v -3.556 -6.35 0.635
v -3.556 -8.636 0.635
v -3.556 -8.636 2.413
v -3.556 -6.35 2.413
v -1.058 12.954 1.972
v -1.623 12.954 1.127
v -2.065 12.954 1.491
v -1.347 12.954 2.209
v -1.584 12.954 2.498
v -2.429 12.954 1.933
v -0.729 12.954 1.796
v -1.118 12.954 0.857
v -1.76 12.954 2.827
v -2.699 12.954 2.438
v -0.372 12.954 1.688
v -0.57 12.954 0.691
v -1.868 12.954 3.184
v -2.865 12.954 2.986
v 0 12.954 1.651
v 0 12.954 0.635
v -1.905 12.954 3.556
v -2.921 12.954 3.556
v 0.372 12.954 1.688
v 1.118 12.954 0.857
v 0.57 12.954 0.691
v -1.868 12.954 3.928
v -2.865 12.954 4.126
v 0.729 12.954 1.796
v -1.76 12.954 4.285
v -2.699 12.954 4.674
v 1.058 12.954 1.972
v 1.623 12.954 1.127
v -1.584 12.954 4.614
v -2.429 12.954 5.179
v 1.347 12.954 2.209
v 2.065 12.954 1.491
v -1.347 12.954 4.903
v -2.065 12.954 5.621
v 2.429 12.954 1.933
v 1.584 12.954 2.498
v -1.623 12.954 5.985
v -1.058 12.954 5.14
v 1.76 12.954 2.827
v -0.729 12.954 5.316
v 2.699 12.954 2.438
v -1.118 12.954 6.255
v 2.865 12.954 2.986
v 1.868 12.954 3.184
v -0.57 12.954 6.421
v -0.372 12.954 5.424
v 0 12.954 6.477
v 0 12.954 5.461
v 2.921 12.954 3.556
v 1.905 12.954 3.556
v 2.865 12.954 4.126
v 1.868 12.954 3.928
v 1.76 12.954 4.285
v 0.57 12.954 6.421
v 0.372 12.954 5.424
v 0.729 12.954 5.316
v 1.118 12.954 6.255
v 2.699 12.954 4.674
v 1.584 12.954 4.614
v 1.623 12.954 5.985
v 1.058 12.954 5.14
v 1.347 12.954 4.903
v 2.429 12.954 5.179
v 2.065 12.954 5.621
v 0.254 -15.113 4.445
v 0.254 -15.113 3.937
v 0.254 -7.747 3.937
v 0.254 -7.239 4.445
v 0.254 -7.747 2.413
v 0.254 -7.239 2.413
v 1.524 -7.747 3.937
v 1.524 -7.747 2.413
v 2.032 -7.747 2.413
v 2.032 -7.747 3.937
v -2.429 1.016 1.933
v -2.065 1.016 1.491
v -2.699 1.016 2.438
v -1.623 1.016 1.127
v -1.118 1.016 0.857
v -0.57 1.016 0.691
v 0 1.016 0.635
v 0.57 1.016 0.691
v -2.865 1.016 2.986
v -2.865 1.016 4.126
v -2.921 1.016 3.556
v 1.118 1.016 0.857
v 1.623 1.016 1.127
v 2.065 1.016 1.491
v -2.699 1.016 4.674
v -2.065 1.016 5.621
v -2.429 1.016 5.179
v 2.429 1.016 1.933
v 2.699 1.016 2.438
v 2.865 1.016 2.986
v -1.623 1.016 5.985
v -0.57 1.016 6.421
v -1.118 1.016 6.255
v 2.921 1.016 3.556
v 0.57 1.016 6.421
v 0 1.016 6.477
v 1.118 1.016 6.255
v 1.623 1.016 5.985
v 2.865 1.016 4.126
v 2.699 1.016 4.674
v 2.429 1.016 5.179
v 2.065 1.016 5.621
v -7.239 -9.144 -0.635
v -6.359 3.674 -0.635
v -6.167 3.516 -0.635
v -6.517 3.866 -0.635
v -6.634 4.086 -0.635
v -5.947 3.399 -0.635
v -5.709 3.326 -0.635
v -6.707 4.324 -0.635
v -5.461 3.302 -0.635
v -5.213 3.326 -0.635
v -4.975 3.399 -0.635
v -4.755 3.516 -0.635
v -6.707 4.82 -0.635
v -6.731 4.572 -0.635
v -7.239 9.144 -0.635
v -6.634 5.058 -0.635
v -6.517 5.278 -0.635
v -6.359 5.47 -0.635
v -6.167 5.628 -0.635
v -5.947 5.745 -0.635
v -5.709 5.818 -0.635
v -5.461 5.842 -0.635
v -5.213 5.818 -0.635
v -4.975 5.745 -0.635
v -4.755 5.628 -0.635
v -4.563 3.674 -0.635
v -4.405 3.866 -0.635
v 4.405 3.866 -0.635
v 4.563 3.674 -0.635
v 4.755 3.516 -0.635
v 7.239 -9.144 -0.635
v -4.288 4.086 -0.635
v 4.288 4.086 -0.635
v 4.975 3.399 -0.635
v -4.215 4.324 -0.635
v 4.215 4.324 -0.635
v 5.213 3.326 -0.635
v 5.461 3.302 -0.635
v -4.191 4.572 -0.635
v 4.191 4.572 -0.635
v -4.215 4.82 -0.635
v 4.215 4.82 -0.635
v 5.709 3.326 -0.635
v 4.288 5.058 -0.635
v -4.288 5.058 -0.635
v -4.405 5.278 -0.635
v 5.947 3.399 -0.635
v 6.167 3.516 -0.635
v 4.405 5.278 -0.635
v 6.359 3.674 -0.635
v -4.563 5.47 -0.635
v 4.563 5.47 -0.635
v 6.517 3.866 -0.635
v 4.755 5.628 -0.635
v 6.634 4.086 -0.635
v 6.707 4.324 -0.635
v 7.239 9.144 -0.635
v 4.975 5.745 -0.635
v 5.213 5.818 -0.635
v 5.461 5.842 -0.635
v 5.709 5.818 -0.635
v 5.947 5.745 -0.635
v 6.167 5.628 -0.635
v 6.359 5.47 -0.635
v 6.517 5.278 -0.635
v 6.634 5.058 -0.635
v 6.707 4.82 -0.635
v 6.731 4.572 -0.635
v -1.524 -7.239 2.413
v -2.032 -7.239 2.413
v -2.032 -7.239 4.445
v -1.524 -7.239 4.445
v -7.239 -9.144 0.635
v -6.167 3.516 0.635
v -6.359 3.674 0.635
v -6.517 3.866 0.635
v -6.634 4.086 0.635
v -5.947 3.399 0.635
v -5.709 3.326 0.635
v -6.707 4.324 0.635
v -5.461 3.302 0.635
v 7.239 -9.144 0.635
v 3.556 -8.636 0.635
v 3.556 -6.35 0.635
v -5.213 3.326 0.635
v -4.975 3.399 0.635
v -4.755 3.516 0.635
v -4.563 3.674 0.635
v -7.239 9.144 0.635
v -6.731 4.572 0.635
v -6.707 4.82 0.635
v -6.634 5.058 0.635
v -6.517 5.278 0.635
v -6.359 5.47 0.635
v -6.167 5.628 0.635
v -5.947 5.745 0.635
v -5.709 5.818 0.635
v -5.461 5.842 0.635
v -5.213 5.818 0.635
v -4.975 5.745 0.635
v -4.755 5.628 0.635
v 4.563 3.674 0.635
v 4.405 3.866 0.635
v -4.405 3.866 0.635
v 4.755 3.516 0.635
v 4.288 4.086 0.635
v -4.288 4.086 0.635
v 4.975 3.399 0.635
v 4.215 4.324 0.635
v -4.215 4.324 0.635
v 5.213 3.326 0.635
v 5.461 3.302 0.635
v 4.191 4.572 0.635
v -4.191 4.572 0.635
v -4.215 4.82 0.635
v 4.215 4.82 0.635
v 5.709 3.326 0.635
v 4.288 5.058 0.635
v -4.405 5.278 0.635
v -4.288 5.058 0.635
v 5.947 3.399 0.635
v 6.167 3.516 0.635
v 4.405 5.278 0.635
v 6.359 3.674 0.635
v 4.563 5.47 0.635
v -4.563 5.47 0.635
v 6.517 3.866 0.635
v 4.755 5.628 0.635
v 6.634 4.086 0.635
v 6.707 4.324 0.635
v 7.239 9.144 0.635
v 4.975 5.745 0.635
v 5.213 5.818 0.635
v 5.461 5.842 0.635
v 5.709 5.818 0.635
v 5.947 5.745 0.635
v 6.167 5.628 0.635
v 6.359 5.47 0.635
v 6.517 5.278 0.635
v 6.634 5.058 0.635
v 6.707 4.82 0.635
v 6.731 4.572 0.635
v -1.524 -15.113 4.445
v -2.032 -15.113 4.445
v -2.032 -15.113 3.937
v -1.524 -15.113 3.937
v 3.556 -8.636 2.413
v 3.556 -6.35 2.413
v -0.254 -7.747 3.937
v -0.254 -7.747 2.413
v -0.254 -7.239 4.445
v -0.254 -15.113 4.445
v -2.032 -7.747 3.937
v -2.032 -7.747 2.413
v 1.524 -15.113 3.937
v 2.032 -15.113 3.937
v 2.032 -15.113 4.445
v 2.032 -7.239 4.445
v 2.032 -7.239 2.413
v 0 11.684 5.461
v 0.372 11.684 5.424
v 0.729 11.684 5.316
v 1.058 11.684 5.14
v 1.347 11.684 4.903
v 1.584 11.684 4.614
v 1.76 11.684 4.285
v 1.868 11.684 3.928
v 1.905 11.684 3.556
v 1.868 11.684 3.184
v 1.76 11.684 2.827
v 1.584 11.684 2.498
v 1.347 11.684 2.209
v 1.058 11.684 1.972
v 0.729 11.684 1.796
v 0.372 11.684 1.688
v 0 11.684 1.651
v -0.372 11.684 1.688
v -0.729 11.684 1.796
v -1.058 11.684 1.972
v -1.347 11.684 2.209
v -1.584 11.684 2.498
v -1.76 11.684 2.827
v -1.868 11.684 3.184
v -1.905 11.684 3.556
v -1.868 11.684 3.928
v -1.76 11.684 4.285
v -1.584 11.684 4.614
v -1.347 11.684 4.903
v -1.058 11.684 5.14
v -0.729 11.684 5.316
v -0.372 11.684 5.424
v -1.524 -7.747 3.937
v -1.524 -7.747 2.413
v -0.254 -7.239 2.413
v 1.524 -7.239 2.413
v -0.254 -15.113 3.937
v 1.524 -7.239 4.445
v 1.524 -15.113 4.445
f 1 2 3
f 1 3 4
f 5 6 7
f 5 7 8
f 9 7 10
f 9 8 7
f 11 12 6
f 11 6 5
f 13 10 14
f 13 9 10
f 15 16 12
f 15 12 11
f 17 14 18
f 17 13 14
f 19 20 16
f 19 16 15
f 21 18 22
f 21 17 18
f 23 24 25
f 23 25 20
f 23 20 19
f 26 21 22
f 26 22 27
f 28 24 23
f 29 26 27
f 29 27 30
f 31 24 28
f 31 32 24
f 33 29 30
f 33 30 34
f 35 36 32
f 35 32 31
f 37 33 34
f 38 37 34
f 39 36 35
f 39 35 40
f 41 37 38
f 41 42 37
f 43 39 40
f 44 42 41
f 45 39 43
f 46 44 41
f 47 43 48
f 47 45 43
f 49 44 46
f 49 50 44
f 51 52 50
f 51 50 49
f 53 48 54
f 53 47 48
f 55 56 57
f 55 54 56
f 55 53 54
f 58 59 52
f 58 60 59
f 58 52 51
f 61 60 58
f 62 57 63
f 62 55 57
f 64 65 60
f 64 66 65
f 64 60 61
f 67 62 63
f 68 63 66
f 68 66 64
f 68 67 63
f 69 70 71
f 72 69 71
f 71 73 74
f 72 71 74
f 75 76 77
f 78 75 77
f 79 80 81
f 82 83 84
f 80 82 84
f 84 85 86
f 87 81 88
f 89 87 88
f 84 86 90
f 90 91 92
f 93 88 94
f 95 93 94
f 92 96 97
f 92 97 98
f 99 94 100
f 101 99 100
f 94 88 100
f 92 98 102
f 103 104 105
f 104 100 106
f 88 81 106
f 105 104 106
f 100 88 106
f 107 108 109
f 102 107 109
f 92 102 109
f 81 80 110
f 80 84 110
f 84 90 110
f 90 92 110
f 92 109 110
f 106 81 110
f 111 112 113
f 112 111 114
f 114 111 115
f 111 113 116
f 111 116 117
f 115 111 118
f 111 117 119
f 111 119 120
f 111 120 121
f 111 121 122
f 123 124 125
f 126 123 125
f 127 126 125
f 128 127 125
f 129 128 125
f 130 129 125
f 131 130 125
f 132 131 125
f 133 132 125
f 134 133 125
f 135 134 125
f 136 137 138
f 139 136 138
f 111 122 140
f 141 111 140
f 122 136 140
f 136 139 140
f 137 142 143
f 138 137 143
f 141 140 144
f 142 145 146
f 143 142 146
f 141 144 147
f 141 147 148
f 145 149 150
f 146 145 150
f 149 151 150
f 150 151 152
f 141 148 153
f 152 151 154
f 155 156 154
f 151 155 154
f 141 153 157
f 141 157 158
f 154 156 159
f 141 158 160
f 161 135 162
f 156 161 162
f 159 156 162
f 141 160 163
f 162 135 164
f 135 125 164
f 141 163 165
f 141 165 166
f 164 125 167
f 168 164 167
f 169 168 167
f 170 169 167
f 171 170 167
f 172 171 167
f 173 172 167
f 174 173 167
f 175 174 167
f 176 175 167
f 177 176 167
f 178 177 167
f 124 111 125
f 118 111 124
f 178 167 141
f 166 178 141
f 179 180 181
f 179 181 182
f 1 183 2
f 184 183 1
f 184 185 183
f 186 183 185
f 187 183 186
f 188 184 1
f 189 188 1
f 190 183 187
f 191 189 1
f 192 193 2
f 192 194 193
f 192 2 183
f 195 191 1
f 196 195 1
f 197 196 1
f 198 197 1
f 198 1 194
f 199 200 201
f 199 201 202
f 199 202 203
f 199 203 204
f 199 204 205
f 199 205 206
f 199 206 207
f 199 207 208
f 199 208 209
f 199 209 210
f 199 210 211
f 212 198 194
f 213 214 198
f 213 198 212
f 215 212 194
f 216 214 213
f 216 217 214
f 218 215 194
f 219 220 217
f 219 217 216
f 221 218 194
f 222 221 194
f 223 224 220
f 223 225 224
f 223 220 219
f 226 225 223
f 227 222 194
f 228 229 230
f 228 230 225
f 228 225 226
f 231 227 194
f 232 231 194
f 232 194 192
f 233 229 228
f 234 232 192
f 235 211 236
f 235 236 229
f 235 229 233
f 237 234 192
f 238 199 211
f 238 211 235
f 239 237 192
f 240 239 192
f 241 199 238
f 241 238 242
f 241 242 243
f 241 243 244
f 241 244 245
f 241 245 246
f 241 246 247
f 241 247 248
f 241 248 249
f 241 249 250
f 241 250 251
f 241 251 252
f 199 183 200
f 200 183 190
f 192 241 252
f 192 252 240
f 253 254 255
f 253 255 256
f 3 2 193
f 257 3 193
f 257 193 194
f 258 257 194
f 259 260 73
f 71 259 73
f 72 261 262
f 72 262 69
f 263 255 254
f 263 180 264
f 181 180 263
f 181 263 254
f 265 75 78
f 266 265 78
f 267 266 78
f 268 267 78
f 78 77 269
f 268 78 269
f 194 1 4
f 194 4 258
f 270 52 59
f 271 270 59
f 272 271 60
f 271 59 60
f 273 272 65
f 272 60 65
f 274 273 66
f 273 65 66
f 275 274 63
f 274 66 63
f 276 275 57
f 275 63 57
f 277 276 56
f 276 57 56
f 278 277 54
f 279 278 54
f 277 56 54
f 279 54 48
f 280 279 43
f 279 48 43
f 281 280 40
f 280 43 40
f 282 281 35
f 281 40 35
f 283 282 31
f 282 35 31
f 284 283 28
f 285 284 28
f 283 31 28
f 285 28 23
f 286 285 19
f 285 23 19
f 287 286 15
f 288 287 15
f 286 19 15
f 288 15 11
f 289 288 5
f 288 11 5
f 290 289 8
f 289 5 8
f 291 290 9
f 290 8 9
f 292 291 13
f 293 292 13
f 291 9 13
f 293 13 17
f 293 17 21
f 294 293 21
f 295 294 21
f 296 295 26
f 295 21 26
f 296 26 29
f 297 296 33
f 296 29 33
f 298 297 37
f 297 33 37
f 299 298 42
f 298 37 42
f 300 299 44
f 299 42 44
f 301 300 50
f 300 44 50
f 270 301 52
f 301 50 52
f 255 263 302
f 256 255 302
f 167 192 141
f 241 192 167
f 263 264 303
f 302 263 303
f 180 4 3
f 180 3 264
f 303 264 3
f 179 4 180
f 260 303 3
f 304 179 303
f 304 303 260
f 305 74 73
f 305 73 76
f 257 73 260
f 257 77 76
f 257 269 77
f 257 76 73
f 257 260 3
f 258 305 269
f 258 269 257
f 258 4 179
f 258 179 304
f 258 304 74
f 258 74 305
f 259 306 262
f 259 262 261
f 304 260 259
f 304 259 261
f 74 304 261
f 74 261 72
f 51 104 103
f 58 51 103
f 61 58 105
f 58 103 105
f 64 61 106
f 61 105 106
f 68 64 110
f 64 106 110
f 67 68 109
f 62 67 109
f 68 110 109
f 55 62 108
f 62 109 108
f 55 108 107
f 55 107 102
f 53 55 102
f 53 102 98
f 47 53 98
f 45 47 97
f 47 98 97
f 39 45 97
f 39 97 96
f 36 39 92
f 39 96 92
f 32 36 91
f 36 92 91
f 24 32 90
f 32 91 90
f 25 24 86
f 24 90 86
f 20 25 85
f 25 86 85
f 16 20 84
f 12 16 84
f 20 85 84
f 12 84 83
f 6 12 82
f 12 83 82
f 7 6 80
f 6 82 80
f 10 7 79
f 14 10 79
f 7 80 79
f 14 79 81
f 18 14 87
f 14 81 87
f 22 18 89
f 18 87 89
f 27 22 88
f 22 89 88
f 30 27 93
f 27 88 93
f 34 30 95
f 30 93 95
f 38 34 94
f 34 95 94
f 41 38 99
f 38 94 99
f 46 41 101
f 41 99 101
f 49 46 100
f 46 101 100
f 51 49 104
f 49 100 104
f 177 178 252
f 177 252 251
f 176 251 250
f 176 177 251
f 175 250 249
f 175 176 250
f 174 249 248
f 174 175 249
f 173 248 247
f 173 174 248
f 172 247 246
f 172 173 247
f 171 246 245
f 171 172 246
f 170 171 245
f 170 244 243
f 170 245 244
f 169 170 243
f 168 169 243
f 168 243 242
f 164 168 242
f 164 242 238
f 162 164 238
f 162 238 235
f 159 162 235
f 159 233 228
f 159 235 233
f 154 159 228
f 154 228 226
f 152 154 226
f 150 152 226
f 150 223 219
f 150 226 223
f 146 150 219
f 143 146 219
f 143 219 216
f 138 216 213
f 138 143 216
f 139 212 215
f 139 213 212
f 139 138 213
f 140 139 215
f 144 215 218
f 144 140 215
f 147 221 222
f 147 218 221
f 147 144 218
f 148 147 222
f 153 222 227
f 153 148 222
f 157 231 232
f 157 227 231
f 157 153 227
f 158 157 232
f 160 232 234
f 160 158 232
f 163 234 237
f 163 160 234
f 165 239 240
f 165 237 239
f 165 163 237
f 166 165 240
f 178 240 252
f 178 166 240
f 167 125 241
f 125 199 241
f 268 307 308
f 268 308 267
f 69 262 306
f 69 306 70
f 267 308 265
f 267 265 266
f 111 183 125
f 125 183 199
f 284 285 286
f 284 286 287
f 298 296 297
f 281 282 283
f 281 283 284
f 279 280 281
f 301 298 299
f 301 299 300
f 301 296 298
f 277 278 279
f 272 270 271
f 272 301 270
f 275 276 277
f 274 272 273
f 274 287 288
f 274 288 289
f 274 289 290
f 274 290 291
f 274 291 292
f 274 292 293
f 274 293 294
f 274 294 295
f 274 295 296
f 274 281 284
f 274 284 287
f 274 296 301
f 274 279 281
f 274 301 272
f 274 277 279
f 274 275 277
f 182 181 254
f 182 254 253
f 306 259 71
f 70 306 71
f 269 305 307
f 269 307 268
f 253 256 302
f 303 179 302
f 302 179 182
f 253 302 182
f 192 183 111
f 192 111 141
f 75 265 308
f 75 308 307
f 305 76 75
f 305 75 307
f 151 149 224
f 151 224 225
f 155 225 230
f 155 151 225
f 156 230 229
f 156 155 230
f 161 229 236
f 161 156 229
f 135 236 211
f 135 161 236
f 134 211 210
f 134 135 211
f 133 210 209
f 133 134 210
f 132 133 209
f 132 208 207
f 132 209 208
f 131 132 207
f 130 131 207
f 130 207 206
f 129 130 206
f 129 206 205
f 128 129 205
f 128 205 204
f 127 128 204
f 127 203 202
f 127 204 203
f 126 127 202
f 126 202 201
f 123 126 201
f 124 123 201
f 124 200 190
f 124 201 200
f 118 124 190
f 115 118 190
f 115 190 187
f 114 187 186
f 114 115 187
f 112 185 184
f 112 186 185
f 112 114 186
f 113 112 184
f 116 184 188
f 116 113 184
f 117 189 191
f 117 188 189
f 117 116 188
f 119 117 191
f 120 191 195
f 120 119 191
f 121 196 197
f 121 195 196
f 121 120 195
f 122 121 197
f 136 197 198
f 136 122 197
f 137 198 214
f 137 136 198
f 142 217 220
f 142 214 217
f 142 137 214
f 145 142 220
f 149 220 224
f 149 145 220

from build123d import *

# Parameters (mm, degrees)
SKETCH1_W                = 14.478
SKETCH1_H                = 18.288
BOSS_EXTRUDE1_DEPTH      = 0.635
SKETCH2_W                = 7.112
SKETCH2_H                = 2.286
BOSS_EXTRUDE2_DEPTH      = 1.778
SKETCH3_W                = 0.508
SKETCH3_H                = 0.508
BOSS_EXTRUDE3_DEPTH      = 2.032
SKETCH4_W                = 0.508
SKETCH4_H                = 0.508
BOSS_EXTRUDE4_DEPTH      = 7.366
CUT_EXTRUDE1_DEPTH       = 18.184934972
CUT_EXTRUDE1_DEPTH_BACK  = 18.184934972
SKETCH5_R                = 1.27
BOSS_EXTRUDE5_DEPTH      = 3.81
BOSS_EXTRUDE5_DEPTH_BACK = 8.128
SKETCH6_R                = 2.921
SKETCH7_R                = 1.905
CUT_EXTRUDE2_DEPTH       = 1.27


with BuildPart() as part:
    # Sketch1 → Boss-Extrude1 (new, symmetric)
    with BuildSketch(Plane.XY):
        Rectangle(SKETCH1_W, SKETCH1_H)
    extrude(amount=BOSS_EXTRUDE1_DEPTH, both=True)

    # Sketch2 → Boss-Extrude2 (add)
    with BuildSketch(Plane.XY.offset(0.635)):
        with Locations((0, -7.493)):
            Rectangle(SKETCH2_W, SKETCH2_H)
    extrude(amount=BOSS_EXTRUDE2_DEPTH)

    # Sketch3 → Boss-Extrude3 (add)
    with BuildSketch(Plane.XY.offset(2.413)):
        with Locations((-1.778, -7.493)):
            Rectangle(SKETCH3_W, SKETCH3_H)
        with Locations((0, -7.493)):
            Rectangle(SKETCH3_W, SKETCH3_H)
        with Locations((1.778, -7.493)):
            Rectangle(SKETCH3_W, SKETCH3_H)
    extrude(amount=BOSS_EXTRUDE3_DEPTH)

    # Sketch4 → Boss-Extrude4 (add)
    with BuildSketch(Plane.XZ.offset(7.747)):
        with Locations((-1.778, 4.191)):
            Rectangle(SKETCH4_W, SKETCH4_H)
        with Locations((0, 4.191)):
            Rectangle(SKETCH4_W, SKETCH4_H)
        with Locations((1.778, 4.191)):
            Rectangle(SKETCH4_W, SKETCH4_H)
    extrude(amount=BOSS_EXTRUDE4_DEPTH)

    # Sketch5 → Cut-Extrude1 (cut, two sides: drawn at the far end of the back side and taken through both)
    with BuildSketch(Plane.XY.offset(0.635).offset(-CUT_EXTRUDE1_DEPTH_BACK)):
        with Locations((-5.461, 4.572)):
            Circle(SKETCH5_R)
        with Locations((5.461, 4.572)):
            Circle(SKETCH5_R)
    extrude(amount=CUT_EXTRUDE1_DEPTH + CUT_EXTRUDE1_DEPTH_BACK, mode=Mode.SUBTRACT)


with BuildPart() as body_2:
    # Sketch6 → Boss-Extrude5 (new, two sides: drawn at the far end of the back side and taken through both)
    with BuildSketch(Plane(origin=(0, 9.144, 0), x_dir=(1, 0, 0), z_dir=(0, 1, 0)).offset(-BOSS_EXTRUDE5_DEPTH_BACK)):
        with Locations(Location((0, -3.556, 0), (0, 0, 270))):
            Circle(SKETCH6_R)
    extrude(amount=BOSS_EXTRUDE5_DEPTH + BOSS_EXTRUDE5_DEPTH_BACK)

    # Sketch7 → Cut-Extrude2 (cut)
    with BuildSketch(Plane(origin=(0, 12.954, 0), x_dir=(1, 0, 0), z_dir=(0, 1, 0))):
        with Locations(Location((0, -3.556, 0), (0, 0, 270))):
            Circle(SKETCH7_R)
    extrude(amount=-CUT_EXTRUDE2_DEPTH, mode=Mode.SUBTRACT)


solid = Compound([part.part, body_2.part])
